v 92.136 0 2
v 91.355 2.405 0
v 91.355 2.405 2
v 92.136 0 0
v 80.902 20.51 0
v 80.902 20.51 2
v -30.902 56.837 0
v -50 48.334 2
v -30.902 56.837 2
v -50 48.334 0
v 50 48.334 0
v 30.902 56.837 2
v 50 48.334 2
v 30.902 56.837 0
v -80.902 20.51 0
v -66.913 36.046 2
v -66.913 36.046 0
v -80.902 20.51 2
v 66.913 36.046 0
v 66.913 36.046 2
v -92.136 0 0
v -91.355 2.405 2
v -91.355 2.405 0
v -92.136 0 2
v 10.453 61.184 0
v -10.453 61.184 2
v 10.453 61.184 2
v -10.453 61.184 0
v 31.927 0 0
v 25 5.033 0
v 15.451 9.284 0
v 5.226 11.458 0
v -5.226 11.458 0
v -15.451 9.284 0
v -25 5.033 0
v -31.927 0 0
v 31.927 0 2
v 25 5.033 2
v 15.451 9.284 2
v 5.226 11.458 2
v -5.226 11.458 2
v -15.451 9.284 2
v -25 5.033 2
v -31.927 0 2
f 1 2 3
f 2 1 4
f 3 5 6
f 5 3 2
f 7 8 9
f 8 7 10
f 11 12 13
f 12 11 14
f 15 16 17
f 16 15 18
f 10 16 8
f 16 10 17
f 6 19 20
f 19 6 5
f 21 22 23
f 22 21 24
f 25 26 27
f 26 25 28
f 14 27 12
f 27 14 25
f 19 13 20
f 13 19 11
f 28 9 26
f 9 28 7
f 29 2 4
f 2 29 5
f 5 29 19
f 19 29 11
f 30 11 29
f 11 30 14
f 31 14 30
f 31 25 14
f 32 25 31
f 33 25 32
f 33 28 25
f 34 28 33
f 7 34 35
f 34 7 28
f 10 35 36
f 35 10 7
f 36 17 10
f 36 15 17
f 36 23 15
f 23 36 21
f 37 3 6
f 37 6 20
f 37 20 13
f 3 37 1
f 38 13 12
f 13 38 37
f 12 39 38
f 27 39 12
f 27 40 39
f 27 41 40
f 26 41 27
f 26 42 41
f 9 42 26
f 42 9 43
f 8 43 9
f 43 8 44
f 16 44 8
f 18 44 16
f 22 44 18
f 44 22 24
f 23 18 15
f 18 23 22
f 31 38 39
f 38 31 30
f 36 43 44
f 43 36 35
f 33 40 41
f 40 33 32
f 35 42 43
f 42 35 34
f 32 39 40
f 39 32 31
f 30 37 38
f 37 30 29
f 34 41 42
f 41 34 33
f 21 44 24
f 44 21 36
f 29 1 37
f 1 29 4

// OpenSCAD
d_outer = 200;
d_inner = 100;
h =2 ; 

theta = 135;
r = d_outer/2;
apothem = r * cos(theta/2); 
sagitta = r - apothem;
translate([0,-(sagitta+apothem),0]) difference(){
translate([0,sagitta,0]) difference(){
  cylinder(h=h, d1=d_outer, d2=d_outer);
  cylinder(h=3*h, d1=d_inner, d2=d_inner,center=true);
}
cube([d_outer,d_outer,3*h],true);
}
